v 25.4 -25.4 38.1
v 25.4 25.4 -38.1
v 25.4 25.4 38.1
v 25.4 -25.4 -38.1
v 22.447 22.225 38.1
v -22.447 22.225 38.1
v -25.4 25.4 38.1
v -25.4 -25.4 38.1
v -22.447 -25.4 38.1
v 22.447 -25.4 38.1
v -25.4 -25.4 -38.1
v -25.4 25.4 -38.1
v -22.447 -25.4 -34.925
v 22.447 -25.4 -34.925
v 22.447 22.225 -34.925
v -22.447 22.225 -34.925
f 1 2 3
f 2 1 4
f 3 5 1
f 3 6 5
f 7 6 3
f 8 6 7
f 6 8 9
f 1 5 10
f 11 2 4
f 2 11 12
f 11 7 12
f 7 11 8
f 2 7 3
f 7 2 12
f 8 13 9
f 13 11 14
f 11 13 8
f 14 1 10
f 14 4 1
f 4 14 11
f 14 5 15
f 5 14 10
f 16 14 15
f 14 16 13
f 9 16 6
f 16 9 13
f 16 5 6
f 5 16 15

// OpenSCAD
//BEGIN CUSTOMIZER VARIABLES
/*[door]*/
//How thick is the door?
doorWidth = 1.75;
//
catcherHeight = 3;
//
catcherLength = 2;
/*[advanced]*/
//How thick do you want it to be?
thickness = .125;
//allows units entered to be inches.
scaleFactor = 25.4;
//END CUSTOMIZER VARIABLES
scale(scaleFactor){
	difference(){
		cube([doorWidth+thickness*2,catcherLength,catcherHeight],center = true);
		translate([0,-thickness,thickness]){
			cube([doorWidth*1.01,catcherLength,catcherHeight],center = true);
		}
	}
}
